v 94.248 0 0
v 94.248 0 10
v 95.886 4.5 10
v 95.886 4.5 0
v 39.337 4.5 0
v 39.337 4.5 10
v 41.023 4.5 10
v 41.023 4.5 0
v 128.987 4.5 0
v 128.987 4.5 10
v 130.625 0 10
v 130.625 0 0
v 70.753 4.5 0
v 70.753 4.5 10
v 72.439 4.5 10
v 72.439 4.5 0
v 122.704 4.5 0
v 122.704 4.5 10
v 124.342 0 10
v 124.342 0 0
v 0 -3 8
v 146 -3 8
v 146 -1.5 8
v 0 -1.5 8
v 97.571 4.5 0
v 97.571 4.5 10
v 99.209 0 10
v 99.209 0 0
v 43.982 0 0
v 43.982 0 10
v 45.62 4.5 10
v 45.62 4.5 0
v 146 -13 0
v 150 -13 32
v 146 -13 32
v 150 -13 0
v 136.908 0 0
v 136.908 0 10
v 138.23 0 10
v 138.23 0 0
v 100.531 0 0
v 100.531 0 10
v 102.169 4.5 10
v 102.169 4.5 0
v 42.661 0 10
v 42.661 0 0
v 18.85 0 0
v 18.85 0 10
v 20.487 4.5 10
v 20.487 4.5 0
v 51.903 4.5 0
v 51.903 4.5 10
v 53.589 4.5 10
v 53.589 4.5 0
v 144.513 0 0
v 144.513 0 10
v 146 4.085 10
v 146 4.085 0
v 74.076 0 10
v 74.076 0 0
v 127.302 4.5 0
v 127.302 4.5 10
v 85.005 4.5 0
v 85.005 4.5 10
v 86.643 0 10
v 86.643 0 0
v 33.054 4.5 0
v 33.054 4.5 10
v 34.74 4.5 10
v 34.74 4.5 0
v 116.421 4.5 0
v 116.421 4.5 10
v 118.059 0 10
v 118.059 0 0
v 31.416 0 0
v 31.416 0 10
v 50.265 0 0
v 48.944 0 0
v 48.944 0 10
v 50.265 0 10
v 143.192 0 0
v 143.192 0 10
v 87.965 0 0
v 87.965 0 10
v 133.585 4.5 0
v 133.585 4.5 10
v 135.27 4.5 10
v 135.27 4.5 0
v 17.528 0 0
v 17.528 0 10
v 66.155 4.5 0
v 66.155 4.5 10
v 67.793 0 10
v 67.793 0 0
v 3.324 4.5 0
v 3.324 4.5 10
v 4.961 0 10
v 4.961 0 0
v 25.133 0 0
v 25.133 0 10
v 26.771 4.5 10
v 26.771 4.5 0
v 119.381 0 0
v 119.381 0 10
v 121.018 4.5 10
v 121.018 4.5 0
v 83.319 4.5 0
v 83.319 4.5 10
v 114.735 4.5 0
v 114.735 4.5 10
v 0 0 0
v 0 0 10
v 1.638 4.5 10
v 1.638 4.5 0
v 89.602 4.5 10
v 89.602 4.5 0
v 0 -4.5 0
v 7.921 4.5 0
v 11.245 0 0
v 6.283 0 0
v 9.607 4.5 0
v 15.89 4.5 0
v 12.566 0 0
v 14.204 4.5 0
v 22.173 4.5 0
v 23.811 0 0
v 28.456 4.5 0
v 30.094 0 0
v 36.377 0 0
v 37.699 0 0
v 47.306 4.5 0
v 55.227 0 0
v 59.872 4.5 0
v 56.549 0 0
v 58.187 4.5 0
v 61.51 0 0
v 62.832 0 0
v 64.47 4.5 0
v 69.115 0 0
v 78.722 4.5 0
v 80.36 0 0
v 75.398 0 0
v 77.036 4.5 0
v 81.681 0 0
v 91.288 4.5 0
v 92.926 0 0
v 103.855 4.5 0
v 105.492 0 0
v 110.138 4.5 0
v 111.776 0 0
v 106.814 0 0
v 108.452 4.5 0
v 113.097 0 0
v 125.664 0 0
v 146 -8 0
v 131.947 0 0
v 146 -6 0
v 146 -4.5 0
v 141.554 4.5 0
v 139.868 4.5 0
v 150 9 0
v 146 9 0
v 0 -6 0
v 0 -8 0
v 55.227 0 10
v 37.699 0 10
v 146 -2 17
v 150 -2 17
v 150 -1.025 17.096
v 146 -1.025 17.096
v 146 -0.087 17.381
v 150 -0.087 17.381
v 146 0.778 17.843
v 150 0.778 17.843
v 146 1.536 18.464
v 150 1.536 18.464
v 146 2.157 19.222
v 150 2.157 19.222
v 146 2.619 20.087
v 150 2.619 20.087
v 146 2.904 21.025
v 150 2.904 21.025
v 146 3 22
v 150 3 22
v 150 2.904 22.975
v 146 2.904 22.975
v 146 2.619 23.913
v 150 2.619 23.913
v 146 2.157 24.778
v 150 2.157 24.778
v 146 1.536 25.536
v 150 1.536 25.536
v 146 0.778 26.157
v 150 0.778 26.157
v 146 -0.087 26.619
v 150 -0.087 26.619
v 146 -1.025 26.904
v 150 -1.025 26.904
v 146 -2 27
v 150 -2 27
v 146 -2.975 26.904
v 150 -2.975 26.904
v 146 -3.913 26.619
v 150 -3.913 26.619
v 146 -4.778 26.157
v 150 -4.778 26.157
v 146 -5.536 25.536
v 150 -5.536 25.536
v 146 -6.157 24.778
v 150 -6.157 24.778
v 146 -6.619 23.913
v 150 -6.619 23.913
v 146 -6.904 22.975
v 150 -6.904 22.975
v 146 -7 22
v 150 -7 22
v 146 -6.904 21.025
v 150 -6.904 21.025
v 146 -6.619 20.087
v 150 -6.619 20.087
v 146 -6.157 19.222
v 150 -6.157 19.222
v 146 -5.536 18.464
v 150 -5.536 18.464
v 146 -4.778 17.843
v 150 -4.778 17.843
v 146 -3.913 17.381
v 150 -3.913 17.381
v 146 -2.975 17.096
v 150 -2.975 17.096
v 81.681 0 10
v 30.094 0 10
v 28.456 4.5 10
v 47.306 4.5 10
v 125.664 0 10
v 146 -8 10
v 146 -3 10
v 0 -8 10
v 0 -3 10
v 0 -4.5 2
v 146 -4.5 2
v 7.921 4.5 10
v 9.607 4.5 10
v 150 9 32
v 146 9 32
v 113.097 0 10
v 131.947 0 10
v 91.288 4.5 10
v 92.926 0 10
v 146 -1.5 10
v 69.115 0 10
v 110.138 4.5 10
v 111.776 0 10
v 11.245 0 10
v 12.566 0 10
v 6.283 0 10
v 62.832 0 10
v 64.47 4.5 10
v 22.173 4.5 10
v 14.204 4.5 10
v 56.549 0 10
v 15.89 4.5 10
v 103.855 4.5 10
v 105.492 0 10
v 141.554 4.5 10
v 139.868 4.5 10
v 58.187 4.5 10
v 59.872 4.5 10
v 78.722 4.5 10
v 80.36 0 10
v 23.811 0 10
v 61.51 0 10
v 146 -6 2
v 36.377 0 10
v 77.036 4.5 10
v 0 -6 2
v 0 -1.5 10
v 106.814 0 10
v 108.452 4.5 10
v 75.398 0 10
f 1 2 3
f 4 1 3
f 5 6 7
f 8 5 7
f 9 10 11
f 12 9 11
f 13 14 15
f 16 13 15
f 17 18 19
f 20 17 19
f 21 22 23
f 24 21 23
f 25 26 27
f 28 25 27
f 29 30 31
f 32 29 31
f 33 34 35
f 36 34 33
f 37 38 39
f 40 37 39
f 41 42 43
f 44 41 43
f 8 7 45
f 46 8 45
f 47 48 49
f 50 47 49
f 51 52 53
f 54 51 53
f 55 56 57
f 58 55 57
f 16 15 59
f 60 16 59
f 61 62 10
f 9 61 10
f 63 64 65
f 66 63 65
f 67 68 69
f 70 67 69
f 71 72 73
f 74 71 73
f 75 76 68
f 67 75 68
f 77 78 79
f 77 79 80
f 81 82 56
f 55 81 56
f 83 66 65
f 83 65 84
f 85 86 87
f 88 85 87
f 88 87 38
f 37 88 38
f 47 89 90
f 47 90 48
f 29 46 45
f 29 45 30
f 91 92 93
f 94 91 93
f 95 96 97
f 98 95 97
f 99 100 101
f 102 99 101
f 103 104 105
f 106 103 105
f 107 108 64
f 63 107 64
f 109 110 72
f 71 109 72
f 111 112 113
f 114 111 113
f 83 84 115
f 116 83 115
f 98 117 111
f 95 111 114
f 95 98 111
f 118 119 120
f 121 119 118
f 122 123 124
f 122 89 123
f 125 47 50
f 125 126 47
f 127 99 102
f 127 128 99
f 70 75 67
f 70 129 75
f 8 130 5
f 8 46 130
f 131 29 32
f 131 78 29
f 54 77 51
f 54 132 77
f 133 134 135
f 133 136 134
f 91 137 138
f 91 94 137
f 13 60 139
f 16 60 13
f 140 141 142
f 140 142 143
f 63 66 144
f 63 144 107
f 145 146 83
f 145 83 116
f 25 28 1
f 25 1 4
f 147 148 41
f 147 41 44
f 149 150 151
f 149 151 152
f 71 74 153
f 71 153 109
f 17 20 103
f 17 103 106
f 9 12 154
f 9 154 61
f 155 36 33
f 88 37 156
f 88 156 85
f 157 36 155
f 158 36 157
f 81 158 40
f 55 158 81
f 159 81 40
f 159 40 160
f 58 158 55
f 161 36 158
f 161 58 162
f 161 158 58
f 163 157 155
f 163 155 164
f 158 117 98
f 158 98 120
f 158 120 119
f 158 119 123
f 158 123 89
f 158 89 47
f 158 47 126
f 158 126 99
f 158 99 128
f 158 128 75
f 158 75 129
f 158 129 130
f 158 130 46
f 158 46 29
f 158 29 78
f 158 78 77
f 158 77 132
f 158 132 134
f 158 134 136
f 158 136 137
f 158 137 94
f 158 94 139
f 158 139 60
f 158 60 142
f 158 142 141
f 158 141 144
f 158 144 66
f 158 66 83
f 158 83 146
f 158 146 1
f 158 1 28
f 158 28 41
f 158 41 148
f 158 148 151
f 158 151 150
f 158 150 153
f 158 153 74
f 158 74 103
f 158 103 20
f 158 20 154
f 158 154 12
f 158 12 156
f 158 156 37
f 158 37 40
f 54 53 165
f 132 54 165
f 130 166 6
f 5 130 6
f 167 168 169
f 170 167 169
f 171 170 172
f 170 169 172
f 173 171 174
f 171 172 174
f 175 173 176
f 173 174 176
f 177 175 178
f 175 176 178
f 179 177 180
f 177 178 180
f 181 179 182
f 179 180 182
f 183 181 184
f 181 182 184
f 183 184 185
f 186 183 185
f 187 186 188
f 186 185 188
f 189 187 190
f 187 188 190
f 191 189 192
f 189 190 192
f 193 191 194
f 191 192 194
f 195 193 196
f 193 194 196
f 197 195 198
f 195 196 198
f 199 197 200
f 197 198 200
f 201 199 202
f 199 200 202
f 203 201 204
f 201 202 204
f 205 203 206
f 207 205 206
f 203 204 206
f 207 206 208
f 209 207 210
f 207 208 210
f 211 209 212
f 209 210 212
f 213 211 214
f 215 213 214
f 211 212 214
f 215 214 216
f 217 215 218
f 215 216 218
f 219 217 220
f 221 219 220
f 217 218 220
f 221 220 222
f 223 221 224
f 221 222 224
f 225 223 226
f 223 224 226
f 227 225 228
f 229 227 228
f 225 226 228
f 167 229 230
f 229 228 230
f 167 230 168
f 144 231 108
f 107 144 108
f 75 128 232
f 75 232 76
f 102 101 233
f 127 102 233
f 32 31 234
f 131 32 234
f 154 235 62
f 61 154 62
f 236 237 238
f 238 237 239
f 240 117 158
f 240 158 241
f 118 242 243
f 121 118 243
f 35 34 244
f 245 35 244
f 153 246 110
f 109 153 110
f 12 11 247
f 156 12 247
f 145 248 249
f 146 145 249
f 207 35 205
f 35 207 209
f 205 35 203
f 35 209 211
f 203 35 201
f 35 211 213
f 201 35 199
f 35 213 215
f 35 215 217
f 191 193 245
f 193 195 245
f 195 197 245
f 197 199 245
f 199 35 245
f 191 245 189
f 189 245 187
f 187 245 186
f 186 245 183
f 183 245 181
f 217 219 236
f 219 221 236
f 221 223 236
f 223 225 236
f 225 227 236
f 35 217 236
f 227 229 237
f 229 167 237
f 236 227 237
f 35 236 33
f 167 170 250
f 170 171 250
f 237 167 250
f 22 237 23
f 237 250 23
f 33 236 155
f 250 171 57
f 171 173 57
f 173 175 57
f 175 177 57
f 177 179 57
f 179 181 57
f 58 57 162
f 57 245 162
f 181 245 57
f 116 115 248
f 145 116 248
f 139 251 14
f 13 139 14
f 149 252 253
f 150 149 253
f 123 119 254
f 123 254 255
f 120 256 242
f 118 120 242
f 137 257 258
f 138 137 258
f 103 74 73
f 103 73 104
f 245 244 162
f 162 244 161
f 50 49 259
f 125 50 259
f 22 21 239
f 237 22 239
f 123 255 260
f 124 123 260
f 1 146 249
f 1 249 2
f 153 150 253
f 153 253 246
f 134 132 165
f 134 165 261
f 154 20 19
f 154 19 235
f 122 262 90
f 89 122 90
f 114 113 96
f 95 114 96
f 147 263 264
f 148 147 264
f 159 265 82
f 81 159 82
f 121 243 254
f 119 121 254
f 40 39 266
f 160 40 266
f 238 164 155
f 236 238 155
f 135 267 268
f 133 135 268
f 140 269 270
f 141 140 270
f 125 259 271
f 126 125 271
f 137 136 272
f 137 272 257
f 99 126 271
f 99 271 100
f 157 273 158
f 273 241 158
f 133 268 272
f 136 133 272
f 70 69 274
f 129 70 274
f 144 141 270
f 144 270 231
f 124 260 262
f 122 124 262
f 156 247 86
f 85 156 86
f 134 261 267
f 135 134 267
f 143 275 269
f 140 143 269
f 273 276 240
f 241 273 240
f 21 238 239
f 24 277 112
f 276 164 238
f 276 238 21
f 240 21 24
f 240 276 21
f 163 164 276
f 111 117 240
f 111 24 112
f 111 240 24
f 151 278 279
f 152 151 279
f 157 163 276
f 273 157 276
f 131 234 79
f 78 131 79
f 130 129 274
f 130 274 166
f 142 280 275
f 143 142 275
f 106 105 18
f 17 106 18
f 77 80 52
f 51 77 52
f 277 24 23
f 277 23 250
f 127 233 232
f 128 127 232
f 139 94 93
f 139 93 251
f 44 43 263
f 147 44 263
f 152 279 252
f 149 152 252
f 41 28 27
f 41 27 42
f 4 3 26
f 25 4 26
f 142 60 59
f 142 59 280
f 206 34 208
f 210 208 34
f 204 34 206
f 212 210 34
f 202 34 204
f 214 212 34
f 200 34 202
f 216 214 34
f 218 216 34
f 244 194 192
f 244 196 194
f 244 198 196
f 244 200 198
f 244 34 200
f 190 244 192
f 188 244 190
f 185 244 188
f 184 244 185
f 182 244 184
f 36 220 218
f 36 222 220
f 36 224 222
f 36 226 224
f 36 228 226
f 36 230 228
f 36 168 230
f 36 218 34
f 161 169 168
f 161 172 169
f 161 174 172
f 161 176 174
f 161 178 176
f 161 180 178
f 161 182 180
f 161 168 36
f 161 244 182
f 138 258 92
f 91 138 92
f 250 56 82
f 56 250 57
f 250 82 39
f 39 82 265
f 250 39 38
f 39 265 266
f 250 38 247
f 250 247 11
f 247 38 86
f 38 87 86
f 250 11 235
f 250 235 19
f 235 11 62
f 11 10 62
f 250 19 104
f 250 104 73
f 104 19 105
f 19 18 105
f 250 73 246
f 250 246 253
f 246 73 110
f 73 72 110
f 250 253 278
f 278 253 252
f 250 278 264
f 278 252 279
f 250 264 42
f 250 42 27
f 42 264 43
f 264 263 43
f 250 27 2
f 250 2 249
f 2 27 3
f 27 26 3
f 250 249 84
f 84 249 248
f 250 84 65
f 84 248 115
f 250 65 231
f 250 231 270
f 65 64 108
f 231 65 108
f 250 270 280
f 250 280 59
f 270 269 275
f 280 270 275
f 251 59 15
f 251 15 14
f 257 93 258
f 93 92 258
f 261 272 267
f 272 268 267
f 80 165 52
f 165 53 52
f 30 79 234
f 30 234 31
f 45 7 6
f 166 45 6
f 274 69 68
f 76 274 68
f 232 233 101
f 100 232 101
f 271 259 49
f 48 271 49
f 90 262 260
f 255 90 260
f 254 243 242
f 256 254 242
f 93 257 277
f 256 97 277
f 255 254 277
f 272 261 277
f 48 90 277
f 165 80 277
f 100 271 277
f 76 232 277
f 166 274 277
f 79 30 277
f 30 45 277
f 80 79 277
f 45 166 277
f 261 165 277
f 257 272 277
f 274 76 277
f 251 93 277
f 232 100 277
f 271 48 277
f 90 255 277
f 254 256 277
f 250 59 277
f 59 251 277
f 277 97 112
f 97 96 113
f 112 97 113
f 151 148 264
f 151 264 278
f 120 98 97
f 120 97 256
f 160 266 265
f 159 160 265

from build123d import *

# Parameters (mm, degrees)
SKETCH_1_W             = 150
SKETCH_1_H             = 8
EXTRUDE_1_DEPTH        = 10
EXTRUDE_2_DEPTH        = 10
PATTERN_LINEAR_1_COUNT = 24
PATTERN_LINEAR_1_PITCH = 6.283185307
SKETCH_3_W             = 2
SKETCH_3_H             = 1.5
CUT_EXTRUDE_1_DEPTH    = 151.545674132
SKETCH_4_W             = 32
SKETCH_4_H             = 22
SKETCH_4_R             = 5
EXTRUDE_1_2_DEPTH      = 4


with BuildPart() as part:
    # 草图1 → Extrude 1 (new body)
    with BuildSketch(Plane.XY):
        with Locations((75, -4)):
            Rectangle(SKETCH_1_W, SKETCH_1_H)
    extrude(amount=EXTRUDE_1_DEPTH)

    # 草图2 → 拉伸2 (add)
    with BuildSketch(Plane.XY.offset(10)):
        Polygon((0, 0), (1.637866054, 4.5), (3.323577771, 4.5), (4.961443825, 0), align=None)
    extrude_2 = extrude(amount=-EXTRUDE_2_DEPTH)

    # 阵列(线性)1: 拉伸2 ×24
    with Locations(*[(i * PATTERN_LINEAR_1_PITCH, 0, 0) for i in range(1, PATTERN_LINEAR_1_COUNT)]):
        add(extrude_2)

    # 草图3 → 切除-拉伸1 (cut, through all)
    with BuildSketch(Plane.ZY):
        with Locations((9, -2.25)):
            Rectangle(SKETCH_3_W, SKETCH_3_H)
        with Locations((1, -5.25)):
            Rectangle(SKETCH_3_W, SKETCH_3_H)
    extrude(amount=-CUT_EXTRUDE_1_DEPTH, mode=Mode.SUBTRACT)

    # 草图4 → Extrude 1 2 (add)
    with BuildSketch(Plane(origin=(150, 0, 0), x_dir=(0, 0, -1), z_dir=(1, 0, 0))):
        with Locations((-16, -2)):
            Rectangle(SKETCH_4_W, SKETCH_4_H)
        with Locations((-22, -2)):
            Circle(SKETCH_4_R, mode=Mode.SUBTRACT)
    extrude(amount=-EXTRUDE_1_2_DEPTH)


solid = part.part
